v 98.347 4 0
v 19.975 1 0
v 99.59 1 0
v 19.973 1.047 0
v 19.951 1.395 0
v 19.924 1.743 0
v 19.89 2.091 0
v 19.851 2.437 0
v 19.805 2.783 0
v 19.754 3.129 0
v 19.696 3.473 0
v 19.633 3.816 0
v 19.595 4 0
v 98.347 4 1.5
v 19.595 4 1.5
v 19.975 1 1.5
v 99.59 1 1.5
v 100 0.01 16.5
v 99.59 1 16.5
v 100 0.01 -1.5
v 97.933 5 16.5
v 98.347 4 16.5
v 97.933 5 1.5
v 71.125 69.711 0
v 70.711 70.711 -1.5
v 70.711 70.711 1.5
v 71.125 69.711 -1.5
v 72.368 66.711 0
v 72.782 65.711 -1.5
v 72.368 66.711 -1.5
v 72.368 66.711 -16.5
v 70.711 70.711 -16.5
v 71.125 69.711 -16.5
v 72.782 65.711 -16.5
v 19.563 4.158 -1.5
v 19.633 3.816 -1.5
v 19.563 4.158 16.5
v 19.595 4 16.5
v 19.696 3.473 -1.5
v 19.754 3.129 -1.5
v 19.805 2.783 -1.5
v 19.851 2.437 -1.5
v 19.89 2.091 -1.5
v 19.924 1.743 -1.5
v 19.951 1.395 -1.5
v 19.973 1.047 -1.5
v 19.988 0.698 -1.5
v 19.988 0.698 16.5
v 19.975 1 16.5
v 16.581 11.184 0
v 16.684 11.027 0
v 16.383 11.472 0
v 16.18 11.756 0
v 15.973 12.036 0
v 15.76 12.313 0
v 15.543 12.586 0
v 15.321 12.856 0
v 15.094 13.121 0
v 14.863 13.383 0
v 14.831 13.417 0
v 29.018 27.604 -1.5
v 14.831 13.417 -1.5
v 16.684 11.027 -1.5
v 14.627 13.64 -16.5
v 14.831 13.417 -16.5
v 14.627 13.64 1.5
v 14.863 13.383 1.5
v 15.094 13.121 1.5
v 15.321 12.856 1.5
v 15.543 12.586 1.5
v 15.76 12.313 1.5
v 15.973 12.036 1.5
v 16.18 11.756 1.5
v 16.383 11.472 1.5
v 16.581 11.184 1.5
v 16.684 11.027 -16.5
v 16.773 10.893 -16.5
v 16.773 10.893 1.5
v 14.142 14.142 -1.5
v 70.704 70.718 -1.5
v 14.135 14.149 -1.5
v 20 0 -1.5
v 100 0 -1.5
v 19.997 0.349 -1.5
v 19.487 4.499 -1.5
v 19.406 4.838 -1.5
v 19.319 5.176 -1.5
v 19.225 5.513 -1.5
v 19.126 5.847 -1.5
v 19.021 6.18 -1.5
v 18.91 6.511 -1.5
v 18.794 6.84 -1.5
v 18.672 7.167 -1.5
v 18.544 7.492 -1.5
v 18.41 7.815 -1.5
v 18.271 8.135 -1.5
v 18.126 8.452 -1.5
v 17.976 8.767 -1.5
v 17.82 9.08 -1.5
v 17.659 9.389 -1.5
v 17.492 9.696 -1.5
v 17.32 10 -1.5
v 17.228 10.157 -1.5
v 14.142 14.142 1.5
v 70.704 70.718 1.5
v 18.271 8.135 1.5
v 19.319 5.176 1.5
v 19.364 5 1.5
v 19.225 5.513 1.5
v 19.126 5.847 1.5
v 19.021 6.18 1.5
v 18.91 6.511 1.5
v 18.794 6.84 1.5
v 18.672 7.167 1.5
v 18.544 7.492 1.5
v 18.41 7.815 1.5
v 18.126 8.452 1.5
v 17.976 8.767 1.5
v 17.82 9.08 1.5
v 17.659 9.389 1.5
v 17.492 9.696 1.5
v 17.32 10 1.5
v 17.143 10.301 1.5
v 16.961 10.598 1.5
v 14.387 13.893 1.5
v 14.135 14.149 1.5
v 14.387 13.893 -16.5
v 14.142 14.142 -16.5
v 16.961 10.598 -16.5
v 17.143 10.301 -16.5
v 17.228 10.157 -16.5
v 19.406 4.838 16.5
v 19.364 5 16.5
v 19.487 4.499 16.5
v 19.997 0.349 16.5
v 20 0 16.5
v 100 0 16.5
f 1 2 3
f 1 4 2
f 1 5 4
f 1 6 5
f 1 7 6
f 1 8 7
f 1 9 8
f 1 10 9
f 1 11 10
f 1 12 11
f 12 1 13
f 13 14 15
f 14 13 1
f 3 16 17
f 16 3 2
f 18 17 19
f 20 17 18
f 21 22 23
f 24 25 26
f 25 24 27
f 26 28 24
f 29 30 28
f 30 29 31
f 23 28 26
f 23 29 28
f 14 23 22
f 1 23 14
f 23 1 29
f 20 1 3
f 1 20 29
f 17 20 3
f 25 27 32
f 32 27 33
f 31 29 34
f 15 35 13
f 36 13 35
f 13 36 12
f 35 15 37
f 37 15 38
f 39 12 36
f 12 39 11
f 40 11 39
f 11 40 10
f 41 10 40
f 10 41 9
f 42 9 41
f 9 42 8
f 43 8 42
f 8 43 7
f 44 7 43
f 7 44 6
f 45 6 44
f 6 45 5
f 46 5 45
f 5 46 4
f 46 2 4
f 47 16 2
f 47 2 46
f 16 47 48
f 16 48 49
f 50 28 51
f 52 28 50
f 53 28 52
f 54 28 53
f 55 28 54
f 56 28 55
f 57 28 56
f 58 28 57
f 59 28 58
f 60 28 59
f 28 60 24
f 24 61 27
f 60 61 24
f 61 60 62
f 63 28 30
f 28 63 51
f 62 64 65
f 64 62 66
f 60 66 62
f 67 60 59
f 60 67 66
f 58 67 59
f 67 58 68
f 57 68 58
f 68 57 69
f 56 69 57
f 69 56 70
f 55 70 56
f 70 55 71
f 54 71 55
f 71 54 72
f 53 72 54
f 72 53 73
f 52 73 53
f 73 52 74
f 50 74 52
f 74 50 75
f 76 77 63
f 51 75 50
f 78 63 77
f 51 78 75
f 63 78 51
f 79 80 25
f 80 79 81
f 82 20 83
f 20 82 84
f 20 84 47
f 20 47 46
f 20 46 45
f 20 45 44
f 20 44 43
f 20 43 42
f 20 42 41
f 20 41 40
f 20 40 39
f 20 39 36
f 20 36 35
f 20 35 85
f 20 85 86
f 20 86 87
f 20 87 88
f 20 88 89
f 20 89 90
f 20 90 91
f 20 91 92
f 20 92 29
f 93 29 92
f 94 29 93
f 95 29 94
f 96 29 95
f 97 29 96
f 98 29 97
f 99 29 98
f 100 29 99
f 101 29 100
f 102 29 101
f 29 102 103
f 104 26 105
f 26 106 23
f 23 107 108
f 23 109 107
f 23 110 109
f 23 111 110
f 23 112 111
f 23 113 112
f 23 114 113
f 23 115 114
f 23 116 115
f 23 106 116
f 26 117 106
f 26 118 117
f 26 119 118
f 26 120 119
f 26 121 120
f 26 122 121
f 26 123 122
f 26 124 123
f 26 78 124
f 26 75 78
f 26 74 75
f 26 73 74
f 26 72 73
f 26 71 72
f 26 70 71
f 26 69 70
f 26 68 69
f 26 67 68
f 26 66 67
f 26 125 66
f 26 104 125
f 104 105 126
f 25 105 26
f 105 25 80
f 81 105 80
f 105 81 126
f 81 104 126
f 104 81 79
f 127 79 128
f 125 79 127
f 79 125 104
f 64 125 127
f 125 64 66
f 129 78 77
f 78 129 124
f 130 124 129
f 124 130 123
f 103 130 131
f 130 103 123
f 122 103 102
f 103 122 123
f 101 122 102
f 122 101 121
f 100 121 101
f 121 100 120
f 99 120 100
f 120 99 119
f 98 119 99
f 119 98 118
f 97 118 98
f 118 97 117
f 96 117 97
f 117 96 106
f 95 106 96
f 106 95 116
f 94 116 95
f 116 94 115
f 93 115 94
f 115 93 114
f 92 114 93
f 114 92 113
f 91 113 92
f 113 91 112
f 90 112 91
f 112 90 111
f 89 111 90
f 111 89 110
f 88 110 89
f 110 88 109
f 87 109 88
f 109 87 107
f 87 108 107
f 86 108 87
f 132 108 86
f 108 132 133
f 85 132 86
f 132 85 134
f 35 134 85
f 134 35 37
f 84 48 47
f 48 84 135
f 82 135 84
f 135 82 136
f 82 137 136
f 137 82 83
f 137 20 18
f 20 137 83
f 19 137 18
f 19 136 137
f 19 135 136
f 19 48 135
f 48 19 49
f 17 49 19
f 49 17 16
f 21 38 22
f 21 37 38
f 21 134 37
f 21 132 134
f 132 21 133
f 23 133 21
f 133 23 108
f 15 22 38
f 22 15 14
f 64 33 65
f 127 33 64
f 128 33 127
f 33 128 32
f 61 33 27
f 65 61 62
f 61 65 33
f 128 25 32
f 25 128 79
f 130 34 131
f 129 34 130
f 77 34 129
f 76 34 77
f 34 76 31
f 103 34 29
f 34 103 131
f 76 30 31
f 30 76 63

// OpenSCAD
$fa = 1;
$fs = 0.1;

OPENING_ANGLE = 45;
HEIGHT = 100;
GRIP_SIZE = 15;
THICKNESS = 3;
CARDBOARD_THICKNESS = 3;

wall();

module wall() {
  difference() {
    translate([0, 0, -THICKNESS/2])
    linear_extrude(THICKNESS)
    side();

    each_edge() {
      knockout();
    }
  }

  each_edge() {
    grip();
  }
}

module side() {
  difference() {
    hull() {
      square([HEIGHT, 0.01]);

      rotate(OPENING_ANGLE)
      square([HEIGHT, 0.01]);
    }

    circle(r=HEIGHT/5);
  }
}

module grip() {
  translate([0, 0, THICKNESS/2])
  union() {
    cube([HEIGHT, 1, GRIP_SIZE]);

    translate([0, CARDBOARD_THICKNESS+1, 0])
    cube([HEIGHT, 1, GRIP_SIZE]);
  }
}

module knockout() {
  translate([0, 1, 0])
  cube([HEIGHT, CARDBOARD_THICKNESS, THICKNESS/2 + 0.01]);
}

module bound() {
  intersection() {
    children();

    translate([0, 0, -50])
    linear_extrude(100)
    side();
  }
}

module each_edge() {
  bound() {
    children();
  }

  bound() {
    rotate(45)
    rotate([180, 0, 0])
    children();
  }
}
/*
function top_len() = sqrt(2*HEIGHT*HEIGHT - 2*HEIGHT*HEIGHT*cos(OPENING_ANGLE));

function top_angle() = asin(HEIGHT * sin(OPENING_ANGLE) / top_len()); */
